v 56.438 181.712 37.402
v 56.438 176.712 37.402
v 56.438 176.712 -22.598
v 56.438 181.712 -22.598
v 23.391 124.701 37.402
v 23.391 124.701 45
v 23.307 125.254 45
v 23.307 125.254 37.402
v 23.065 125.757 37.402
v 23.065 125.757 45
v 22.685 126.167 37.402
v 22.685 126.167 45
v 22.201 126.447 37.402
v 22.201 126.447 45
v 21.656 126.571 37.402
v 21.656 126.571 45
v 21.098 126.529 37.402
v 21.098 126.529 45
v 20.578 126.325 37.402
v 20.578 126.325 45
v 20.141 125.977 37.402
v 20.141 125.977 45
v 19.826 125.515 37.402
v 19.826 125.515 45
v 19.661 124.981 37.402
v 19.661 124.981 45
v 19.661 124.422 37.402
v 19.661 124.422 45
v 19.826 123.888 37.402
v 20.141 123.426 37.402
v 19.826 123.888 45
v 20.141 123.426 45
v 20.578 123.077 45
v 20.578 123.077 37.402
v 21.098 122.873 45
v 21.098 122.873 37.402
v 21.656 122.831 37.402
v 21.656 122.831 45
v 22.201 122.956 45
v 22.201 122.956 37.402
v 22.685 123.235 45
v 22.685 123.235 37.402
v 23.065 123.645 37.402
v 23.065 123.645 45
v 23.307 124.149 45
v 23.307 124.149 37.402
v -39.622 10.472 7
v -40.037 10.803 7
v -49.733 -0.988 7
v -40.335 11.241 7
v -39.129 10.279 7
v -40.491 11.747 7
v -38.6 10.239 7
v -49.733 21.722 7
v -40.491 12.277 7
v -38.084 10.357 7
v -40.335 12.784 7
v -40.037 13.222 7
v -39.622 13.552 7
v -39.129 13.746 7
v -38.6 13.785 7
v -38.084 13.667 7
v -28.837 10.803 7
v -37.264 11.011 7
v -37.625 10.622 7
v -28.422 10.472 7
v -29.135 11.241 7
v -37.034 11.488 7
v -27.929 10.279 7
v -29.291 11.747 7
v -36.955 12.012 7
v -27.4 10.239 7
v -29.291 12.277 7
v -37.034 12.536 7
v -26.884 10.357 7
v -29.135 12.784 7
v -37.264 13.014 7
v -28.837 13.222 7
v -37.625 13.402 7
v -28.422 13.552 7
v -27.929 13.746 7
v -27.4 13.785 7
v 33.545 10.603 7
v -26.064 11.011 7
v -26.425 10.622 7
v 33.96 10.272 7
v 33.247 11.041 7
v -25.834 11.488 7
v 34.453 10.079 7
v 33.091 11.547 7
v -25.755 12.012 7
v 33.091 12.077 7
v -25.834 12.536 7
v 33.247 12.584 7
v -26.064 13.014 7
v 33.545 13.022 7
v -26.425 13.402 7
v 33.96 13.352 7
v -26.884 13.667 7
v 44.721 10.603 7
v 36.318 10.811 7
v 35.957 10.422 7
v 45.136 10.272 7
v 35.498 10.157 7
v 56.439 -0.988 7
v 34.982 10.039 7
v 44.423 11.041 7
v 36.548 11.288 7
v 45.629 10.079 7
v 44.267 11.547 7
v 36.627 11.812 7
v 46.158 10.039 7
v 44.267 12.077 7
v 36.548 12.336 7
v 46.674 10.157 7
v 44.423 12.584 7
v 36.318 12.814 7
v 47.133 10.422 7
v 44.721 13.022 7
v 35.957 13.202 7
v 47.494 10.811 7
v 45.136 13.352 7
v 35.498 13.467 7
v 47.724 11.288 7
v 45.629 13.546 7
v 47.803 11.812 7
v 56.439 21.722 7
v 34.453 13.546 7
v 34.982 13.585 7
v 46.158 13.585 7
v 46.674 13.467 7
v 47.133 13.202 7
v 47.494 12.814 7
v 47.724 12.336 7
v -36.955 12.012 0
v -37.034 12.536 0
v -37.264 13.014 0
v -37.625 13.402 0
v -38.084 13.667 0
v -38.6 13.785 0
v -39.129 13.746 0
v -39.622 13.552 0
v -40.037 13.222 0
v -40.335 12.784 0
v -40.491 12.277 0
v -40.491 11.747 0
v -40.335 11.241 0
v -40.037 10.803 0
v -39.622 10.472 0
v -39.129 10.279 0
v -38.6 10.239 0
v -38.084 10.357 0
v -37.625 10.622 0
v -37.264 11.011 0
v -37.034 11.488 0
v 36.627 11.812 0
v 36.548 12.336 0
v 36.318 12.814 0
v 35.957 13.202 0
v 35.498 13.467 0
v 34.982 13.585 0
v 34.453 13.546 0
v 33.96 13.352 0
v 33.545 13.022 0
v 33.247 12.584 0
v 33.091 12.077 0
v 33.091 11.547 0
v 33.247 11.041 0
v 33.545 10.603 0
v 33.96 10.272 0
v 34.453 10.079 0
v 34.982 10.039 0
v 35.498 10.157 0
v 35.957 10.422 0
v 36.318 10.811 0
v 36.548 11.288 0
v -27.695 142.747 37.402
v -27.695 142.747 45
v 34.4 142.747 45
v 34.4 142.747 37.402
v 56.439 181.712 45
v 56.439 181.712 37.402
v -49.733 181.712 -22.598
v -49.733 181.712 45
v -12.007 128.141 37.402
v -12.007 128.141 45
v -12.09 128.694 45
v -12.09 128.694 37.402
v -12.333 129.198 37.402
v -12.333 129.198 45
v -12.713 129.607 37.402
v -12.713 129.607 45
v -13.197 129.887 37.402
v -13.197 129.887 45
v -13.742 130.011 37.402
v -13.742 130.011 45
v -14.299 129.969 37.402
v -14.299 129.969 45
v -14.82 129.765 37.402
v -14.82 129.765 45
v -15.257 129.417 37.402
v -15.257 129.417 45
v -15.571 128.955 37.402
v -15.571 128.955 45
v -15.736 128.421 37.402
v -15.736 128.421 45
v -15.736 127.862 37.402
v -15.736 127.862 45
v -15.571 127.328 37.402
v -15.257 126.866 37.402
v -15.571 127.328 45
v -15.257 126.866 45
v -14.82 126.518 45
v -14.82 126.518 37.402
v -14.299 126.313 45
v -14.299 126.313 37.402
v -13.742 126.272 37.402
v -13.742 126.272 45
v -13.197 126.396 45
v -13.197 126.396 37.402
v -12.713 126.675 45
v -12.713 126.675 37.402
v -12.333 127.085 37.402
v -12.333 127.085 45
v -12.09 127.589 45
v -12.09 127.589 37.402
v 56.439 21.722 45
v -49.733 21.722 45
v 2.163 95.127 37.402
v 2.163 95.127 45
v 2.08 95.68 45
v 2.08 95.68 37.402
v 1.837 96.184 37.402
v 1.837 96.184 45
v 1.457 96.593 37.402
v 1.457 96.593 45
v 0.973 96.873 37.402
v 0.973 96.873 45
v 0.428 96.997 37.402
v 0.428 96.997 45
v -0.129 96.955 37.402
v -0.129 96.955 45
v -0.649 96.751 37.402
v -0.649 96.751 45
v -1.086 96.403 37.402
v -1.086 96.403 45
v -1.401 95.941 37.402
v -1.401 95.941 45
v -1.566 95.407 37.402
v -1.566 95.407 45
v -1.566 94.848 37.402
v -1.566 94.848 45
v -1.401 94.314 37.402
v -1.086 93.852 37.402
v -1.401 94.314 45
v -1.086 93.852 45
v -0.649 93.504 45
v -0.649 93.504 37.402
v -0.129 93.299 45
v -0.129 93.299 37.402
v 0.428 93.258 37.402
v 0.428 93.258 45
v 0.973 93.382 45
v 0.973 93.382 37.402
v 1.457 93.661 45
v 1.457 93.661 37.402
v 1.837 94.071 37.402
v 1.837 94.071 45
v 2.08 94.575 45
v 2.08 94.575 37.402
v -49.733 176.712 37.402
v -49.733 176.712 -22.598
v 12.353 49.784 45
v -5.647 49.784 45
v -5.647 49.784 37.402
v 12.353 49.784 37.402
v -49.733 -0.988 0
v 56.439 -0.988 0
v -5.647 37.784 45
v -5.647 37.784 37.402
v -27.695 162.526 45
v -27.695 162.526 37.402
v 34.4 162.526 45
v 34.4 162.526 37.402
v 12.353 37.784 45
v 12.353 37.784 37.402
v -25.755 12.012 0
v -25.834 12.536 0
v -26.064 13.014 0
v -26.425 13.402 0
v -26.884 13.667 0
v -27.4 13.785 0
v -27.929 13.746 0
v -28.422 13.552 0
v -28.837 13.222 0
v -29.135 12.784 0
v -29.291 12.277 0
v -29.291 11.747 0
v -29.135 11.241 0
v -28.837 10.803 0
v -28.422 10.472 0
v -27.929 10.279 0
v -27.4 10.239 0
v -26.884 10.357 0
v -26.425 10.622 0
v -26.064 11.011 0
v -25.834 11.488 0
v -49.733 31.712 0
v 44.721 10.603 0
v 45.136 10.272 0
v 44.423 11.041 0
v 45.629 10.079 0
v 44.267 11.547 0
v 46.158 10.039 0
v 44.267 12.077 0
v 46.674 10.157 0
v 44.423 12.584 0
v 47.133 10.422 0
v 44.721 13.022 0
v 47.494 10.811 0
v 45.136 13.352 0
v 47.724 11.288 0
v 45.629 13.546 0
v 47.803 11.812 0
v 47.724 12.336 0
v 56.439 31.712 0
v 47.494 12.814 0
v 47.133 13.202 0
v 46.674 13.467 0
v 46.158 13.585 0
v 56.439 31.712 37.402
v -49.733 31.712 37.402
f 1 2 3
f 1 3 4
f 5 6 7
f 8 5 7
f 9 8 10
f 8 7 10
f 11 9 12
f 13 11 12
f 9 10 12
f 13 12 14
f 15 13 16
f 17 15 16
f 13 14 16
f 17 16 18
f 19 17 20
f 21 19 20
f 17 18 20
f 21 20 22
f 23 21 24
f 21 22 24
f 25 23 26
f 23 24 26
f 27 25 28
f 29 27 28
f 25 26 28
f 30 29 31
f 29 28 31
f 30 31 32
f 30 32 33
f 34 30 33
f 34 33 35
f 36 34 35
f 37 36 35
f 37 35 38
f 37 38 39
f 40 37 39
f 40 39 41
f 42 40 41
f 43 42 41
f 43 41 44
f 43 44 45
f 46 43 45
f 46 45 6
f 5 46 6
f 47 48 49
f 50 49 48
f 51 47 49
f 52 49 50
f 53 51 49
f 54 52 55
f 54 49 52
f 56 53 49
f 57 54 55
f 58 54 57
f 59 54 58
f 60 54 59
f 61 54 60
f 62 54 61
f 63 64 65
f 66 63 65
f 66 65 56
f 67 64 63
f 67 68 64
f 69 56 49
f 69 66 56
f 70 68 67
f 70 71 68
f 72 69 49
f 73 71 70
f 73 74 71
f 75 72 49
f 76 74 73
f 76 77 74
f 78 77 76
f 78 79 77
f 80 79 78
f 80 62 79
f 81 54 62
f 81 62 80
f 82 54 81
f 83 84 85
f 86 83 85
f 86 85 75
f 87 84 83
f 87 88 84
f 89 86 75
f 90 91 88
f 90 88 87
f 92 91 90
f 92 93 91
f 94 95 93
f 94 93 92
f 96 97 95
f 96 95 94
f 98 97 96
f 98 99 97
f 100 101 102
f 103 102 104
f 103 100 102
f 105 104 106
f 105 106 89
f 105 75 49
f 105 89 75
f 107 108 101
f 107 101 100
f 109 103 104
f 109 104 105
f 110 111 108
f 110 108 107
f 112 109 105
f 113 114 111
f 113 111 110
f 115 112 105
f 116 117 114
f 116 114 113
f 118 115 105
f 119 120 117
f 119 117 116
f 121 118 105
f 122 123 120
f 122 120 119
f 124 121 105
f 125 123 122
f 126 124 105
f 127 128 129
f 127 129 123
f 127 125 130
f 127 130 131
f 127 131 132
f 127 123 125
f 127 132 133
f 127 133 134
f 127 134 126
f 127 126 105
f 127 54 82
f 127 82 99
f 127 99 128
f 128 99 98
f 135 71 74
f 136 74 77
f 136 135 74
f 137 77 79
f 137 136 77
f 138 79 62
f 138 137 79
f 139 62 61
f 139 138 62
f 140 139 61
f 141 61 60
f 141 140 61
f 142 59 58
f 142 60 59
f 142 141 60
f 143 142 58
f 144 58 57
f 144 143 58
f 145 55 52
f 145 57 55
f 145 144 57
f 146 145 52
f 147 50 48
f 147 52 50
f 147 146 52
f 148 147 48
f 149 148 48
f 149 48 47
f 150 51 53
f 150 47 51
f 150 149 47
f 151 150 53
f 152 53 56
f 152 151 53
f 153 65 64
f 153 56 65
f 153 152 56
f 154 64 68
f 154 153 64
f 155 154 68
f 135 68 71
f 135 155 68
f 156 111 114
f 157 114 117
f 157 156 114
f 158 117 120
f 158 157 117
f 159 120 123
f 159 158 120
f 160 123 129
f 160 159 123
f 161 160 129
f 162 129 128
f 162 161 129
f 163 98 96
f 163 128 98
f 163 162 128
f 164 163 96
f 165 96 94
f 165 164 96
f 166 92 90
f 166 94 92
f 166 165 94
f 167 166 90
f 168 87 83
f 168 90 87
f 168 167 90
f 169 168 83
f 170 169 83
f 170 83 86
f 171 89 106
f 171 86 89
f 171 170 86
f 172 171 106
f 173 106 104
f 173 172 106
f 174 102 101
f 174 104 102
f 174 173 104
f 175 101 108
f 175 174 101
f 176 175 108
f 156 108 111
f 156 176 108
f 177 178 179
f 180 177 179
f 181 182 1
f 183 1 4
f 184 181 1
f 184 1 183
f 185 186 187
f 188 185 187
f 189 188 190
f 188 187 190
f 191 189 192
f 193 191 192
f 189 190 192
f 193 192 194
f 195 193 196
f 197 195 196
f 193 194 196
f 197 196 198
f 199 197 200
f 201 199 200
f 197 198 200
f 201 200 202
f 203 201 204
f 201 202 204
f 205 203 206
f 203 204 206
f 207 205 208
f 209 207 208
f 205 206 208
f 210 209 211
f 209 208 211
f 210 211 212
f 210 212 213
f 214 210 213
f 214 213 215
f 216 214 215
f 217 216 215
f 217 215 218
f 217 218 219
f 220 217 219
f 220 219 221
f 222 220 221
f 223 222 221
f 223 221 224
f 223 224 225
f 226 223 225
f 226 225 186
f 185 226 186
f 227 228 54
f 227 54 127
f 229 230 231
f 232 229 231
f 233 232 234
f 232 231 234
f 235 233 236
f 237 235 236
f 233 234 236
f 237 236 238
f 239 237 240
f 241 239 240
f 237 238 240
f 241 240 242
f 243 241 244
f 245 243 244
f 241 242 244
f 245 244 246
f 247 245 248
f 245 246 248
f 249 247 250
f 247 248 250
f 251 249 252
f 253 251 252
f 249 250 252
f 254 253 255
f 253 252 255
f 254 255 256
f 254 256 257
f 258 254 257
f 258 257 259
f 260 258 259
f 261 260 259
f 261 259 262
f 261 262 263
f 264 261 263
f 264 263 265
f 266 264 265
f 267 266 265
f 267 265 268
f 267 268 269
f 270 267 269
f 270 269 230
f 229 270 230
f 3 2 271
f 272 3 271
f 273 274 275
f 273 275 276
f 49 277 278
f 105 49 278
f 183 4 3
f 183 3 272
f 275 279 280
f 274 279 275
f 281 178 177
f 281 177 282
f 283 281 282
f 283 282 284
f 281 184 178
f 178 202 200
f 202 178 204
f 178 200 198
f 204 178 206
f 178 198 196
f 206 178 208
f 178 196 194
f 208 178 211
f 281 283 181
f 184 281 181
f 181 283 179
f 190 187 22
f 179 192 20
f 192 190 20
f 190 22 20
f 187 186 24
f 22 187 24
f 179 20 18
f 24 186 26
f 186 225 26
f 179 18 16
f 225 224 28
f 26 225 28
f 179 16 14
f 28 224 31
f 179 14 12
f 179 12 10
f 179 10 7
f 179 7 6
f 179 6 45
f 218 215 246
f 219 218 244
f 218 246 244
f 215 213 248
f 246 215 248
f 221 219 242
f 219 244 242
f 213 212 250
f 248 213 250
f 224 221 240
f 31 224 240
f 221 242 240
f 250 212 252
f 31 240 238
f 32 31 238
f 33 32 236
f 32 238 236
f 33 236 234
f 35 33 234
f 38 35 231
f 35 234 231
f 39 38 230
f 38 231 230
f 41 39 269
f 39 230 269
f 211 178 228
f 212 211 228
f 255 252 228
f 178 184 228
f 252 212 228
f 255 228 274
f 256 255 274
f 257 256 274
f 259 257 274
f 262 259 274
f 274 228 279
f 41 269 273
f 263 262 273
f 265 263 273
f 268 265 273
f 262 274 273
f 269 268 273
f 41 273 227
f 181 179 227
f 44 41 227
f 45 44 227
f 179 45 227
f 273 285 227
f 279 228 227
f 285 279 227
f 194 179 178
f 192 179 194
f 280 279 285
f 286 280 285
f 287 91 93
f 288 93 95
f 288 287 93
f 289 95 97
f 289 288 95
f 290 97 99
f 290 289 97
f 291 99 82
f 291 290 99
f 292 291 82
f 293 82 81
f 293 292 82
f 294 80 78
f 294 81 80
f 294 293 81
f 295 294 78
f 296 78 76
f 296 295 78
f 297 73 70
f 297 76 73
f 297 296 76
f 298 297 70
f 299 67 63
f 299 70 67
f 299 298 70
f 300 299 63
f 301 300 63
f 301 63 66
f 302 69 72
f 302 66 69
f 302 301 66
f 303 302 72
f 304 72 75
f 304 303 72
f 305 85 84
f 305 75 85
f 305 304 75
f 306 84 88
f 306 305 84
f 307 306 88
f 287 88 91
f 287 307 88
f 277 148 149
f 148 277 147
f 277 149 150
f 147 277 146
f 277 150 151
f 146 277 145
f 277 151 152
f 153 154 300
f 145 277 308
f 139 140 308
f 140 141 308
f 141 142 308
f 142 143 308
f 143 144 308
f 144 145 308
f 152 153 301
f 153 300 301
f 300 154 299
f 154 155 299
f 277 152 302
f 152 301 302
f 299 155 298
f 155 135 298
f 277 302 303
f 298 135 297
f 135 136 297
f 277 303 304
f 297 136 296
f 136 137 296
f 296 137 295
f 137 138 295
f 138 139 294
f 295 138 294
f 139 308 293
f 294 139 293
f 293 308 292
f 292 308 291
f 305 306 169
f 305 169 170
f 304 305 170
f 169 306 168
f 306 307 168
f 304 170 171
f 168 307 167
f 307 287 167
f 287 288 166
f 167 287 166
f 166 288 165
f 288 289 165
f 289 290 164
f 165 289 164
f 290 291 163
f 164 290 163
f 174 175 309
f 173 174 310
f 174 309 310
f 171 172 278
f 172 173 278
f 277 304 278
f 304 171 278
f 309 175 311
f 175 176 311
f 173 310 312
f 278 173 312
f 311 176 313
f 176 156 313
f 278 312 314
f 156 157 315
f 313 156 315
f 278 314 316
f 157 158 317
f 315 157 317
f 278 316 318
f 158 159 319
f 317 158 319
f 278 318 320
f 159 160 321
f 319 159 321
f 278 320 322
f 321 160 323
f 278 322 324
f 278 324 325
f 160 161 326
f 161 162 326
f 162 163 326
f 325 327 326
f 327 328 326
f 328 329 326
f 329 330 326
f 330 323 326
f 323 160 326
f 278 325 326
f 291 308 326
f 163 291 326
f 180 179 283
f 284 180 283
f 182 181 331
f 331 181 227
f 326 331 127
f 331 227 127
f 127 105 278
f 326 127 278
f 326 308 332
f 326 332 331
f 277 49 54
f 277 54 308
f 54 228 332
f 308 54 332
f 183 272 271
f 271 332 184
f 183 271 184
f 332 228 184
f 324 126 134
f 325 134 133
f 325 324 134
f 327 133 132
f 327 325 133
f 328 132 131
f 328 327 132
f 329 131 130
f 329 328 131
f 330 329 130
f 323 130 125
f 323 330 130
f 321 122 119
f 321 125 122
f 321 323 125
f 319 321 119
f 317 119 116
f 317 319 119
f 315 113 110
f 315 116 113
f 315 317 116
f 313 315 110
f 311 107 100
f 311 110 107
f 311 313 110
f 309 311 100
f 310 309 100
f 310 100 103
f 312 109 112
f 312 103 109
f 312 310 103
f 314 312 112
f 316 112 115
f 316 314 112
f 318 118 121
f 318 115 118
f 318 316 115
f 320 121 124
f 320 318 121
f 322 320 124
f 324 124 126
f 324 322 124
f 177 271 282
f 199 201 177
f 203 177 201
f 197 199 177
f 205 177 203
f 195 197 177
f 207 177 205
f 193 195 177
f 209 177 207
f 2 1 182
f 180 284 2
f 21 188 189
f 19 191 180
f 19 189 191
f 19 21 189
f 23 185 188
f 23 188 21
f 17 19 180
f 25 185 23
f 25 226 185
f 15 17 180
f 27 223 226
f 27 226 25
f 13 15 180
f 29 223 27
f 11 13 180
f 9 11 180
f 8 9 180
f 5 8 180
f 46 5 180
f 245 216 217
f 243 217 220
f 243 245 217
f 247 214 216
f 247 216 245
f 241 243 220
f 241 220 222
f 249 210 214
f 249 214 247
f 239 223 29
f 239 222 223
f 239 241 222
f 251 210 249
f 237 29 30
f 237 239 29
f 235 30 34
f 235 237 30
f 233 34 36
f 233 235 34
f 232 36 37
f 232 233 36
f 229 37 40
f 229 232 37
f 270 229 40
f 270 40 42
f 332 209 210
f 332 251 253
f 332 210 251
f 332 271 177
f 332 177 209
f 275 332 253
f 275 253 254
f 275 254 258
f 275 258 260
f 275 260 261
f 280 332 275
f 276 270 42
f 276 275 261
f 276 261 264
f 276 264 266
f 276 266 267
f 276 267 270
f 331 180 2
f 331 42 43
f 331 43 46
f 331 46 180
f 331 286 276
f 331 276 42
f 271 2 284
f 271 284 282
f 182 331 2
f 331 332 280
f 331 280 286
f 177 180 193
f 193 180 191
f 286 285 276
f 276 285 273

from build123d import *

# Parameters (mm, degrees)
SKETCH_1_W          = 106.172
SKETCH_1_H          = 32.7
SKETCH_1_R          = 1.778
EXTRUDE_1_DEPTH     = 15
SKETCH_2_W          = 106.172
SKETCH_2_H          = 32.7
SKETCH_2_R          = 1.778
EXTRUDE_2_DEPTH     = 30
EXTRUDE_3_DEPTH     = 106
SKETCH_8_W          = 106.172
SKETCH_8_H          = 7.597957824
EXTRUDE_5_DEPTH     = 140
CUT_EXTRUDE_1_DEPTH = 146
SKETCH_11_W         = 106.172
SKETCH_11_H         = 7.597957824
EXTRUDE_7_DEPTH     = 10
SKETCH_15_W         = 106.17086593
SKETCH_15_H         = 5
EXTRUDE_11_DEPTH    = 60
SKETCH_16_W         = 18
SKETCH_16_H         = 12
CUT_EXTRUDE_2_DEPTH = 7.8
SKETCH_18_R         = 1.875
CUT_EXTRUDE_3_DEPTH = 10
SKETCH_20_W         = 106.172
SKETCH_20_H         = 22.709616495
CUT_EXTRUDE_4_DEPTH = 33
SKETCH_21_W         = 106.172
SKETCH_21_H         = 22.709616495
CUT_EXTRUDE_5_DEPTH = 5
SKETCH_30_W         = 62.094803524
SKETCH_30_H         = 19.778637262
CUT_EXTRUDE_6_DEPTH = 10


with BuildPart() as part:
    # 스케치1 → 보스-돌출1 (new body)
    with BuildSketch(Plane.XY):
        with Locations((3.3528, 15.362172506)):
            Rectangle(SKETCH_1_W, SKETCH_1_H)
        with Locations((46.0248, 11.812172506)):
            Circle(SKETCH_1_R, mode=Mode.SUBTRACT)
        with Locations((34.8488, 11.812172506)):
            Circle(SKETCH_1_R, mode=Mode.SUBTRACT)
        with Locations((-38.7332, 12.012172506)):
            Circle(SKETCH_1_R, mode=Mode.SUBTRACT)
        with Locations((-27.5332, 12.012172506)):
            Circle(SKETCH_1_R, mode=Mode.SUBTRACT)
    extrude(amount=EXTRUDE_1_DEPTH)

    # 스케치2 → 보스-돌출2 (add)
    with BuildSketch(Plane.XY.offset(15)):
        with Locations((3.3528, 15.362172506)):
            Rectangle(SKETCH_2_W, SKETCH_2_H)
        with Locations((-38.7332, 12.012172506)):
            Circle(SKETCH_2_R, mode=Mode.SUBTRACT)
        with Locations((-27.5332, 12.012172506)):
            Circle(SKETCH_2_R, mode=Mode.SUBTRACT)
        with Locations((34.8488, 11.812172506)):
            Circle(SKETCH_2_R, mode=Mode.SUBTRACT)
        with Locations((46.0248, 11.812172506)):
            Circle(SKETCH_2_R, mode=Mode.SUBTRACT)
    extrude(amount=EXTRUDE_2_DEPTH)

    # 스케치4 → 보스-돌출3 (add)
    with BuildSketch(Plane.ZY.offset(49.7332)):
        Polygon((45, -0.987827494), (25.502768184, 31.712172506), (45, 31.712172506), align=None)
    extrude(amount=-EXTRUDE_3_DEPTH)

    # 스케치8 → 보스-돌출5 (add)
    with BuildSketch(Plane(origin=(0, 31.712172506, 0), x_dir=(1, 0, 0), z_dir=(0, 1, 0))):
        with Locations((3.3528, -41.201021088)):
            Rectangle(SKETCH_8_W, SKETCH_8_H)
    extrude(amount=EXTRUDE_5_DEPTH)

    # 스케치9 → 컷-돌출1 (cut)
    with BuildSketch(Plane.ZY.offset(49.7332)):
        Polygon((45, -0.987827494), (17.051243473, -0.987827494), (45, 21.721789001), align=None)
    extrude(amount=-CUT_EXTRUDE_1_DEPTH, mode=Mode.SUBTRACT)

    # 스케치11 → 보스-돌출7 (add)
    with BuildSketch(Plane(origin=(0, 171.712172506, 0), x_dir=(1, 0, 0), z_dir=(0, 1, 0))):
        with Locations((3.3528, -41.201021088)):
            Rectangle(SKETCH_11_W, SKETCH_11_H)
    extrude(amount=EXTRUDE_7_DEPTH)

    # 스케치15 → 보스-돌출11 (add)
    with BuildSketch(Plane(origin=(0, 0, 37.402042176), x_dir=(-1, 0, 0), z_dir=(0, 0, -1))):
        with Locations((-3.352232965, 179.212172506)):
            Rectangle(SKETCH_15_W, SKETCH_15_H)
    extrude(amount=EXTRUDE_11_DEPTH)

    # 스케치16 → 컷-돌출2 (cut)
    with BuildSketch(Plane.XY.offset(45)):
        with Locations((3.3528, 43.784089849)):
            Rectangle(SKETCH_16_W, SKETCH_16_H)
    extrude(amount=-CUT_EXTRUDE_2_DEPTH, mode=Mode.SUBTRACT)

    # 스케치18 → 컷-돌출3 (cut)
    with BuildSketch(Plane.XY.offset(45)):
        with Locations((-13.882118572, 128.141421182)):
            Circle(SKETCH_18_R)
        with Locations((21.515537396, 124.701234261)):
            Circle(SKETCH_18_R)
        with Locations((0.28811198, 95.127423383)):
            Circle(SKETCH_18_R)
    extrude(amount=-CUT_EXTRUDE_3_DEPTH, mode=Mode.SUBTRACT)

    # 스케치20 → 컷-돌출4 (cut)
    with BuildSketch(Plane.XY.offset(45)):
        with Locations((3.3528, 10.366980754)):
            Rectangle(SKETCH_20_W, SKETCH_20_H)
    extrude(amount=-CUT_EXTRUDE_4_DEPTH, mode=Mode.SUBTRACT)

    # 스케치21 → 컷-돌출5 (cut)
    with BuildSketch(Plane.XY.offset(12)):
        with Locations((3.3528, 10.366980754)):
            Rectangle(SKETCH_21_W, SKETCH_21_H)
    extrude(amount=-CUT_EXTRUDE_5_DEPTH, mode=Mode.SUBTRACT)

    # 스케치30 → 컷-돌출6 (cut)
    with BuildSketch(Plane.XY.offset(45)):
        with Locations((3.3528, 152.636415487)):
            Rectangle(SKETCH_30_W, SKETCH_30_H)
    extrude(amount=-CUT_EXTRUDE_6_DEPTH, mode=Mode.SUBTRACT)


solid = part.part
